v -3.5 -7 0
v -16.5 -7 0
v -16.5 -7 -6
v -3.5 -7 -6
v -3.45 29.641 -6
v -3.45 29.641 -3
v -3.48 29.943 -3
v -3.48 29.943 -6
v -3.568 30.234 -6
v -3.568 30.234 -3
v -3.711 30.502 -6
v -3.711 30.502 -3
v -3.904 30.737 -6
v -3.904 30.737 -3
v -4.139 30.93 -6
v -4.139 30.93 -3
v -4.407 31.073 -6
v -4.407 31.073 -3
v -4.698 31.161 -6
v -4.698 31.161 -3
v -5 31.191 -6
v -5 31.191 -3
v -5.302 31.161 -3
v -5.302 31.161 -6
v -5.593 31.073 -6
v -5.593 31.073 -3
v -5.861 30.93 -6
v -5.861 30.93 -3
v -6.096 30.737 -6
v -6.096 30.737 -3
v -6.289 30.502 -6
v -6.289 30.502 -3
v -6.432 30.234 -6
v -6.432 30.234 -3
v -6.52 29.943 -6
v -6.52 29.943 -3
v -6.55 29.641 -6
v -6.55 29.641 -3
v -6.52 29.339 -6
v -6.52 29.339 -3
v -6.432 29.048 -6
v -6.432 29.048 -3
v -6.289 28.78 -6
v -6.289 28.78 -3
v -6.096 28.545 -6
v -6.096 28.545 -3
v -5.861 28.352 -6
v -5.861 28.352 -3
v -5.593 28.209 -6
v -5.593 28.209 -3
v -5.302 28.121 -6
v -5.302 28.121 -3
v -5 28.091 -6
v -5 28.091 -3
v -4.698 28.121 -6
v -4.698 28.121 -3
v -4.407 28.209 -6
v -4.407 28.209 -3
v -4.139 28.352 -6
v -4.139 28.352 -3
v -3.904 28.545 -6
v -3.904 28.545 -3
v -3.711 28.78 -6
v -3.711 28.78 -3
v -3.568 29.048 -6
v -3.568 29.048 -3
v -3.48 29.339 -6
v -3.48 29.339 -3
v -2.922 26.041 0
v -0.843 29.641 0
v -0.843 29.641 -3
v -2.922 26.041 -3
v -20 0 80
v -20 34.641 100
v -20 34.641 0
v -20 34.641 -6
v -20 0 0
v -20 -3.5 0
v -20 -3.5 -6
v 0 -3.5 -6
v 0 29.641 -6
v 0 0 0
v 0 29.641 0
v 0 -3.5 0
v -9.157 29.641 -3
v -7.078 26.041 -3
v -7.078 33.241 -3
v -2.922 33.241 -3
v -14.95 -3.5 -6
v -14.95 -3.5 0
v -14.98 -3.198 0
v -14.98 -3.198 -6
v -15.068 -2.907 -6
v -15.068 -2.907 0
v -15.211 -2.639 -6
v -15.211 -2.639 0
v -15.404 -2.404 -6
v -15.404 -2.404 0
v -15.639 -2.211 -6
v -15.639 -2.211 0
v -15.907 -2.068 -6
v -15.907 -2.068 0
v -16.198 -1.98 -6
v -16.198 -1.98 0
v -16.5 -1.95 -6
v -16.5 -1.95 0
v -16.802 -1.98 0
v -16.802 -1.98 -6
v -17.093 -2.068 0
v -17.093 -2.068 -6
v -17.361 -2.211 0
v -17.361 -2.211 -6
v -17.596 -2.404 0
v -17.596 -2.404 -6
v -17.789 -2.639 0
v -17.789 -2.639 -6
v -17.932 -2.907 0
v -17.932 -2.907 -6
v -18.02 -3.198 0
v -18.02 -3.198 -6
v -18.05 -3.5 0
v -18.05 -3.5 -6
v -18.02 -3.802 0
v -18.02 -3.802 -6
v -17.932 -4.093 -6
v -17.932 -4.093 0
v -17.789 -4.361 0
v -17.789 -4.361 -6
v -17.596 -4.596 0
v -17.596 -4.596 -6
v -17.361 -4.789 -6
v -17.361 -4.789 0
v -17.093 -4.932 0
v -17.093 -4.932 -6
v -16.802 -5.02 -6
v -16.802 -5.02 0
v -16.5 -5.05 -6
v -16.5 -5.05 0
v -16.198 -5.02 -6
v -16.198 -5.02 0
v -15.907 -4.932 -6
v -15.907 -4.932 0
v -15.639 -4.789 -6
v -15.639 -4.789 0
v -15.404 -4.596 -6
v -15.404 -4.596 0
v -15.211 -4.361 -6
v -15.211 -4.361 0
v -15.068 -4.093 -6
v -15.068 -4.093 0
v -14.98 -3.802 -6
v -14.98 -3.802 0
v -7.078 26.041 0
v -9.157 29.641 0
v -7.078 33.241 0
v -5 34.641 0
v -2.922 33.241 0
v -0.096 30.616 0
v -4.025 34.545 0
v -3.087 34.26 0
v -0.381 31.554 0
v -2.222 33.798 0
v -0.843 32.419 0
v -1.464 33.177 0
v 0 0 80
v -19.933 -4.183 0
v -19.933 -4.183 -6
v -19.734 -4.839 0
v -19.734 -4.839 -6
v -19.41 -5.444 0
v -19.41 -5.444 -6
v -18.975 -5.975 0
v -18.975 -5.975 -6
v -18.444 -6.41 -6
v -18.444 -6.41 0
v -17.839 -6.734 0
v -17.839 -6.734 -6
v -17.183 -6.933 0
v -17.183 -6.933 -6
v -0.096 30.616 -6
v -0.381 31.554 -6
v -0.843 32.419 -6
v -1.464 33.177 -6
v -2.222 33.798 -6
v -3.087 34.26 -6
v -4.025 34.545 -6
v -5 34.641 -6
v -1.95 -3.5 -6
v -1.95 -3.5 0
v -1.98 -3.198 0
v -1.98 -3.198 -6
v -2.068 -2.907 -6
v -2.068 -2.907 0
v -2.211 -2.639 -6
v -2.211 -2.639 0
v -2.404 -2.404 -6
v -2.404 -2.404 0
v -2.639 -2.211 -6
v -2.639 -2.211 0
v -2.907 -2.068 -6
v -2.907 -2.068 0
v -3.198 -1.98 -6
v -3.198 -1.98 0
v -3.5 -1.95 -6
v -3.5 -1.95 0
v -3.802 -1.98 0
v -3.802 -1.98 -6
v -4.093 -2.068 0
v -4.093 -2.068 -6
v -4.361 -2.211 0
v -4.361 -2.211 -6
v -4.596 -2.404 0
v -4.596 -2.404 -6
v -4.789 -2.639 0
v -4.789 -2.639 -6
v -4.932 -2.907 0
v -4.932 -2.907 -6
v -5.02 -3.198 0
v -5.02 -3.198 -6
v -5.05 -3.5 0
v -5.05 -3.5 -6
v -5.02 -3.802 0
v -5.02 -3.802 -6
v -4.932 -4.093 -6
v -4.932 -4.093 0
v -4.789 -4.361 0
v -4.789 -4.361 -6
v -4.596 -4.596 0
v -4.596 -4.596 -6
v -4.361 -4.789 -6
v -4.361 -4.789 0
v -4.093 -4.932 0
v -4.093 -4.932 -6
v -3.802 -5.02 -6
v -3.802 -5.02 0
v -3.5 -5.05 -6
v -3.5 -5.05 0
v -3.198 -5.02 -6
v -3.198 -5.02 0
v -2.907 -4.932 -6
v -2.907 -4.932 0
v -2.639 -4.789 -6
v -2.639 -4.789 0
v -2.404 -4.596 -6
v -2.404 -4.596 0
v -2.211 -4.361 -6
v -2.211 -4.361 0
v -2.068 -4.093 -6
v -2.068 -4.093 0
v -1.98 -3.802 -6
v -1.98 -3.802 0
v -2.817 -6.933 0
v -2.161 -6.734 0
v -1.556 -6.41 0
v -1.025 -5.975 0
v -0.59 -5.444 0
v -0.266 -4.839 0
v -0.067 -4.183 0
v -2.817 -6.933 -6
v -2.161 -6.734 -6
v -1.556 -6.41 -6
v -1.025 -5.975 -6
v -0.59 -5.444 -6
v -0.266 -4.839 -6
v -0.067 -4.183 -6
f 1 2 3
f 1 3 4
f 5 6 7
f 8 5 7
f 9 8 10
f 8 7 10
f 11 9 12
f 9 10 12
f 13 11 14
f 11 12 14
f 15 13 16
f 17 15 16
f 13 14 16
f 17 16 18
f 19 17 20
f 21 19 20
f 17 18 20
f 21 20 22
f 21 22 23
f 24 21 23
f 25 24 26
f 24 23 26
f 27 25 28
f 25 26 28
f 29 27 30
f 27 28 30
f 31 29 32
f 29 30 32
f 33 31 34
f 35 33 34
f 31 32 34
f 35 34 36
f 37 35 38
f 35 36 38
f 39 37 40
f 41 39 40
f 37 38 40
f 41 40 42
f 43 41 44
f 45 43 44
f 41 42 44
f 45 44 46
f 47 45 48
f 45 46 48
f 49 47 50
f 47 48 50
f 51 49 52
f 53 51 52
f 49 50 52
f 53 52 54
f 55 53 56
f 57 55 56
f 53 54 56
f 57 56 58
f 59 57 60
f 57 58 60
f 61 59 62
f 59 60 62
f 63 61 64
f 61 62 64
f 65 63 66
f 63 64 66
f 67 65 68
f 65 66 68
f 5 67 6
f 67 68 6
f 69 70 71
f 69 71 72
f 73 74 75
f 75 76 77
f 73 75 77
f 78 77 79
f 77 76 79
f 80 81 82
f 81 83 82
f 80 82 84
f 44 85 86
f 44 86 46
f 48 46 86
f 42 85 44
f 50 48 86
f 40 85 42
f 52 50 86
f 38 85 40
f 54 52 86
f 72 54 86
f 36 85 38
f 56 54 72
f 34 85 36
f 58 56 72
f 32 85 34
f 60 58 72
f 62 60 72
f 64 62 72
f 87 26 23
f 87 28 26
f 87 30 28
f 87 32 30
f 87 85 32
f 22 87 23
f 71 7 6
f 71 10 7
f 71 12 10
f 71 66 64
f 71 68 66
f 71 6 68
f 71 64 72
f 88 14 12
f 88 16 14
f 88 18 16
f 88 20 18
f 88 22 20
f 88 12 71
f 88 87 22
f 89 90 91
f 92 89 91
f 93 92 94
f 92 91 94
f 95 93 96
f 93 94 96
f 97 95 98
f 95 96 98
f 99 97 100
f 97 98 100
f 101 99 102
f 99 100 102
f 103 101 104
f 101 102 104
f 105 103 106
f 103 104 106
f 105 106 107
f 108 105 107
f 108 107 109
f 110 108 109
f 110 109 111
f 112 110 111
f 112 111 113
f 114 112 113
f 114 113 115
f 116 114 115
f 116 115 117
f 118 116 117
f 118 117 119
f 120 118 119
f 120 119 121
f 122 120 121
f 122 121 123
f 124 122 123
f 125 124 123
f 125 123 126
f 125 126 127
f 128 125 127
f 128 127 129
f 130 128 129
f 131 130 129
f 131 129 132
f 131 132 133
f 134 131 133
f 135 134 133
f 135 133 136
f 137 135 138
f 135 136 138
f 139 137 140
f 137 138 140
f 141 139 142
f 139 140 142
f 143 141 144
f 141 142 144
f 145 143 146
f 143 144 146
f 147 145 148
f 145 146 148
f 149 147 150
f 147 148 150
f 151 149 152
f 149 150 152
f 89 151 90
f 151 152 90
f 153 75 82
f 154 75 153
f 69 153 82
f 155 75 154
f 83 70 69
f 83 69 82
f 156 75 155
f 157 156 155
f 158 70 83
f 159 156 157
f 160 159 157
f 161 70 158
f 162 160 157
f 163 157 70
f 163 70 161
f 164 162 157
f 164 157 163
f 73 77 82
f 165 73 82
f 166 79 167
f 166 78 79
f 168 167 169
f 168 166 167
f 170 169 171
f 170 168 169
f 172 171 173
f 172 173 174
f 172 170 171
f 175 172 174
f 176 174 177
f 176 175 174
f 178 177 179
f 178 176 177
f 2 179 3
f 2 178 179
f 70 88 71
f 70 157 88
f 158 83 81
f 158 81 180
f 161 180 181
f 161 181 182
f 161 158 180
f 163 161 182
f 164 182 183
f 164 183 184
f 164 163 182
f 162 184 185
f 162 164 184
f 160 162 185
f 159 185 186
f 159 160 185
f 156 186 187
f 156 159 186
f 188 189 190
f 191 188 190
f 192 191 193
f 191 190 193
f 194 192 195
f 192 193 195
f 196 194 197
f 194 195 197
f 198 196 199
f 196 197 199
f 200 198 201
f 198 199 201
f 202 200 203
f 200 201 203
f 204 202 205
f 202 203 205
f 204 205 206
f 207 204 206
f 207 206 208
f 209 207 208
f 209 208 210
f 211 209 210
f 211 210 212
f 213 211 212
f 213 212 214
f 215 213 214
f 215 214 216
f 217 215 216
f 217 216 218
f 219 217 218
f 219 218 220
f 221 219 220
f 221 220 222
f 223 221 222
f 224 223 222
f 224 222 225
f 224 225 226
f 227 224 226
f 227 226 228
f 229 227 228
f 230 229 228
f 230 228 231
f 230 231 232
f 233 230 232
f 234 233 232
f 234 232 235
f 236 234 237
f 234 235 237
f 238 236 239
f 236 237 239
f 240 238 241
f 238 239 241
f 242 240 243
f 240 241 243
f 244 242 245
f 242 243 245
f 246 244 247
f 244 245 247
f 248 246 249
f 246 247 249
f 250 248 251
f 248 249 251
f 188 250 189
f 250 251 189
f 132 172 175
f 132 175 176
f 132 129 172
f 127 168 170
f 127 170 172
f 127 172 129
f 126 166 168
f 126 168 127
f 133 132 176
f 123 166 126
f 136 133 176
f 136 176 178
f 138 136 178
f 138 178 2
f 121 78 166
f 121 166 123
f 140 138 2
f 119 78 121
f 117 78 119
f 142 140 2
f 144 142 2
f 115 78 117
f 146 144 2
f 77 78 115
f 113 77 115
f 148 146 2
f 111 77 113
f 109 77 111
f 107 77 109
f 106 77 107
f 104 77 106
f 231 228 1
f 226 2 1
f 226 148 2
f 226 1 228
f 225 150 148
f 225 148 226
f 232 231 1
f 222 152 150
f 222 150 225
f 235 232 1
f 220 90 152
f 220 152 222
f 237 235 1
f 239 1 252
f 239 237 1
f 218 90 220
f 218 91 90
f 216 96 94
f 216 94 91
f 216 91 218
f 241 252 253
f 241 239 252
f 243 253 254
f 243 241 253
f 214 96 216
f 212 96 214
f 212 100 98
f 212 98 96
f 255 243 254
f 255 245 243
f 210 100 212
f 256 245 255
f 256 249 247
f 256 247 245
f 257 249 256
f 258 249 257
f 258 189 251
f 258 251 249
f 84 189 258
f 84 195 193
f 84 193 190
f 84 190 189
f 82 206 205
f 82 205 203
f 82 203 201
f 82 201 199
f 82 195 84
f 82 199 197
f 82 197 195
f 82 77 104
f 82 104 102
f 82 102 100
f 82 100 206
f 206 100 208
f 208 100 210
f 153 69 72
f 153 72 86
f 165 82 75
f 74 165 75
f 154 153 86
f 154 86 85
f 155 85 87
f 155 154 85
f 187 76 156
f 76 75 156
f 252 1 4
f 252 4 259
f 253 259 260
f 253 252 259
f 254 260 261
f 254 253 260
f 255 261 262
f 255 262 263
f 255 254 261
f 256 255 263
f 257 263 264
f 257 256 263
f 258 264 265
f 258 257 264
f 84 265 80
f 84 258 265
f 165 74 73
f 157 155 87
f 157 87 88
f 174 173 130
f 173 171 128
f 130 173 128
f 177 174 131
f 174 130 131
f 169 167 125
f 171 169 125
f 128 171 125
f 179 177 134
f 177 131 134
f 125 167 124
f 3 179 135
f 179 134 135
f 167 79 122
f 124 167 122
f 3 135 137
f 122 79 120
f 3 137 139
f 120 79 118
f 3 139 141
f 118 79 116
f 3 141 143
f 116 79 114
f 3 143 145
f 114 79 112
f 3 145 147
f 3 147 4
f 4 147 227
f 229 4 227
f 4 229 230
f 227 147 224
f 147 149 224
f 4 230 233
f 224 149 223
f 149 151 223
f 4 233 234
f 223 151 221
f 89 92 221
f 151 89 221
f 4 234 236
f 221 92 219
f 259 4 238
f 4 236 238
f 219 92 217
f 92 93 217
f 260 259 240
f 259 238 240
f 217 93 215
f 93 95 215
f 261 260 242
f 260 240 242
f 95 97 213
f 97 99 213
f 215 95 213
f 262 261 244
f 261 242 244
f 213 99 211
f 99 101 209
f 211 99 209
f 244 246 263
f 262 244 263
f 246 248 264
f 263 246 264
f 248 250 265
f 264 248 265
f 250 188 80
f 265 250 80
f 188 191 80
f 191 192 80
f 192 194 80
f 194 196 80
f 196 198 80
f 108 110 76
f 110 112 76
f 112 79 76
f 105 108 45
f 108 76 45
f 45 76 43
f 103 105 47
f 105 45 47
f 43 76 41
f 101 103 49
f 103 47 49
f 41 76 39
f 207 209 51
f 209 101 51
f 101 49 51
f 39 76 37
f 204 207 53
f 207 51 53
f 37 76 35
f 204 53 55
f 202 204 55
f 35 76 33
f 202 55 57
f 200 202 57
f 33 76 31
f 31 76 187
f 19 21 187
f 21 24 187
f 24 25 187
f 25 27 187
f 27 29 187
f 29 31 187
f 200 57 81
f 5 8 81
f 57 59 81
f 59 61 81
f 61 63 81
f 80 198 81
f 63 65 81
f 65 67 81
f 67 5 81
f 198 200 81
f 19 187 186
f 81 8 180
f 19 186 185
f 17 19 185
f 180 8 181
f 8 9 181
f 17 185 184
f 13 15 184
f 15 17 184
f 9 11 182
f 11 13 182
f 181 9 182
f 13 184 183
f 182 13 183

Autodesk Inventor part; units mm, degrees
ref_plane "YZ Plane" through (0, 0, 0) normal (1, 0, 0) x (0, 1, 0)
ref_plane "XZ Plane" through (0, 0, 0) normal (0, 1, 0) x (-1, 0, 0)
ref_plane "XY Plane" through (0, 0, 0) normal (0, 0, 1) x (1, 0, 0)
sketch "Esquisse1" plane through (0, 0, 0) normal (0, 0, 1) x (1, 0, 0)
  line L0 (0, 0) -> (-20, 34.641)
  line L1 (-20, 34.641) -> (-20, 0)
  line L2 (-20, 0) -> (0, 0)
  line L3 (-20, 34.641) -> (0, 34.641)
  line L4 (0, 34.641) -> (0, 0)
  circle A0 centre (-5, 29.641) radius 5
  circle A1 centre (-5, 29.641) radius 1.55
  line L5 (-7.0785, 26.041) -> (-9.1569, 29.641)
  line L6 (-9.1569, 29.641) -> (-7.0785, 33.241)
  line L7 (-7.0785, 33.241) -> (-2.9215, 33.241)
  line L8 (-2.9215, 33.241) -> (-0.8431, 29.641)
  line L9 (-0.8431, 29.641) -> (-2.9215, 26.041)
  line L10 (-2.9215, 26.041) -> (-7.0785, 26.041)
  line L11 (-20, 0) -> (-20, -7)
  line L12 (-20, -7) -> (0, -7)
  line L13 (0, -7) -> (0, 0)
  line L14 (-20, -3.5) -> (0, -3.5)
  circle A2 centre (-16.5, -3.5) radius 3.5
  circle A3 centre (-3.5, -3.5) radius 3.5
  circle A4 centre (-16.5, -3.5) radius 1.55
  circle A5 centre (-3.5, -3.5) radius 1.55
  point P0 (-16.5, -7)
  point P1 (-3.5, -7)
  point P2 (0, 29.641)
  point P3 (-5, 34.641)
  dimension "d0" = 60
  dimension "d1" = 20
  dimension "d5" = 7
  dimension "d6" = 3.1
  dimension "d7" = 10
  dimension "d8" = 7.2
  dimension "d9" = 3.1
extrude "Extrusion1" add sketch "Esquisse1" along normal blind 100 contours L2 L1 L0
extrude "Extrusion2" add sketch "Esquisse1" against normal blind 6 contours L2 L1 L0 | L13 A3 L2 | L0 L3 A0 L4 | A3 L14 A2 L2 | A3 L14 A5 | A0 | A3 L14 A5 | L2 A2 L11 | A2 L14 A4 | A3 L12 A2 L14 | L14 A4 A2 | L5 L6 L7 L8 L9 L10
extrude "Extrusion3" cut sketch "Esquisse1" against normal blind 3 contours L5 L6 L7 L8 L9 L10
sketch "Esquisse2" plane through (0, 0, 0) normal (1, 0, 0) x (0, 0, -1)
  line L0 (-100, 34.641) -> (-100, 0) projected
  line L1 (-100, 34.641) -> (-80, 0)
  line L2 (0, 0) -> (-100, 0) projected
  line L3 (-80, 0) -> (-100, 0)
  line L4 (-100, 0) -> (-100, 34.641)
  dimension "d16" = 30
extrude "Extrusion4" cut sketch "Esquisse2" against normal through all
properties part number "Doigt droit"
